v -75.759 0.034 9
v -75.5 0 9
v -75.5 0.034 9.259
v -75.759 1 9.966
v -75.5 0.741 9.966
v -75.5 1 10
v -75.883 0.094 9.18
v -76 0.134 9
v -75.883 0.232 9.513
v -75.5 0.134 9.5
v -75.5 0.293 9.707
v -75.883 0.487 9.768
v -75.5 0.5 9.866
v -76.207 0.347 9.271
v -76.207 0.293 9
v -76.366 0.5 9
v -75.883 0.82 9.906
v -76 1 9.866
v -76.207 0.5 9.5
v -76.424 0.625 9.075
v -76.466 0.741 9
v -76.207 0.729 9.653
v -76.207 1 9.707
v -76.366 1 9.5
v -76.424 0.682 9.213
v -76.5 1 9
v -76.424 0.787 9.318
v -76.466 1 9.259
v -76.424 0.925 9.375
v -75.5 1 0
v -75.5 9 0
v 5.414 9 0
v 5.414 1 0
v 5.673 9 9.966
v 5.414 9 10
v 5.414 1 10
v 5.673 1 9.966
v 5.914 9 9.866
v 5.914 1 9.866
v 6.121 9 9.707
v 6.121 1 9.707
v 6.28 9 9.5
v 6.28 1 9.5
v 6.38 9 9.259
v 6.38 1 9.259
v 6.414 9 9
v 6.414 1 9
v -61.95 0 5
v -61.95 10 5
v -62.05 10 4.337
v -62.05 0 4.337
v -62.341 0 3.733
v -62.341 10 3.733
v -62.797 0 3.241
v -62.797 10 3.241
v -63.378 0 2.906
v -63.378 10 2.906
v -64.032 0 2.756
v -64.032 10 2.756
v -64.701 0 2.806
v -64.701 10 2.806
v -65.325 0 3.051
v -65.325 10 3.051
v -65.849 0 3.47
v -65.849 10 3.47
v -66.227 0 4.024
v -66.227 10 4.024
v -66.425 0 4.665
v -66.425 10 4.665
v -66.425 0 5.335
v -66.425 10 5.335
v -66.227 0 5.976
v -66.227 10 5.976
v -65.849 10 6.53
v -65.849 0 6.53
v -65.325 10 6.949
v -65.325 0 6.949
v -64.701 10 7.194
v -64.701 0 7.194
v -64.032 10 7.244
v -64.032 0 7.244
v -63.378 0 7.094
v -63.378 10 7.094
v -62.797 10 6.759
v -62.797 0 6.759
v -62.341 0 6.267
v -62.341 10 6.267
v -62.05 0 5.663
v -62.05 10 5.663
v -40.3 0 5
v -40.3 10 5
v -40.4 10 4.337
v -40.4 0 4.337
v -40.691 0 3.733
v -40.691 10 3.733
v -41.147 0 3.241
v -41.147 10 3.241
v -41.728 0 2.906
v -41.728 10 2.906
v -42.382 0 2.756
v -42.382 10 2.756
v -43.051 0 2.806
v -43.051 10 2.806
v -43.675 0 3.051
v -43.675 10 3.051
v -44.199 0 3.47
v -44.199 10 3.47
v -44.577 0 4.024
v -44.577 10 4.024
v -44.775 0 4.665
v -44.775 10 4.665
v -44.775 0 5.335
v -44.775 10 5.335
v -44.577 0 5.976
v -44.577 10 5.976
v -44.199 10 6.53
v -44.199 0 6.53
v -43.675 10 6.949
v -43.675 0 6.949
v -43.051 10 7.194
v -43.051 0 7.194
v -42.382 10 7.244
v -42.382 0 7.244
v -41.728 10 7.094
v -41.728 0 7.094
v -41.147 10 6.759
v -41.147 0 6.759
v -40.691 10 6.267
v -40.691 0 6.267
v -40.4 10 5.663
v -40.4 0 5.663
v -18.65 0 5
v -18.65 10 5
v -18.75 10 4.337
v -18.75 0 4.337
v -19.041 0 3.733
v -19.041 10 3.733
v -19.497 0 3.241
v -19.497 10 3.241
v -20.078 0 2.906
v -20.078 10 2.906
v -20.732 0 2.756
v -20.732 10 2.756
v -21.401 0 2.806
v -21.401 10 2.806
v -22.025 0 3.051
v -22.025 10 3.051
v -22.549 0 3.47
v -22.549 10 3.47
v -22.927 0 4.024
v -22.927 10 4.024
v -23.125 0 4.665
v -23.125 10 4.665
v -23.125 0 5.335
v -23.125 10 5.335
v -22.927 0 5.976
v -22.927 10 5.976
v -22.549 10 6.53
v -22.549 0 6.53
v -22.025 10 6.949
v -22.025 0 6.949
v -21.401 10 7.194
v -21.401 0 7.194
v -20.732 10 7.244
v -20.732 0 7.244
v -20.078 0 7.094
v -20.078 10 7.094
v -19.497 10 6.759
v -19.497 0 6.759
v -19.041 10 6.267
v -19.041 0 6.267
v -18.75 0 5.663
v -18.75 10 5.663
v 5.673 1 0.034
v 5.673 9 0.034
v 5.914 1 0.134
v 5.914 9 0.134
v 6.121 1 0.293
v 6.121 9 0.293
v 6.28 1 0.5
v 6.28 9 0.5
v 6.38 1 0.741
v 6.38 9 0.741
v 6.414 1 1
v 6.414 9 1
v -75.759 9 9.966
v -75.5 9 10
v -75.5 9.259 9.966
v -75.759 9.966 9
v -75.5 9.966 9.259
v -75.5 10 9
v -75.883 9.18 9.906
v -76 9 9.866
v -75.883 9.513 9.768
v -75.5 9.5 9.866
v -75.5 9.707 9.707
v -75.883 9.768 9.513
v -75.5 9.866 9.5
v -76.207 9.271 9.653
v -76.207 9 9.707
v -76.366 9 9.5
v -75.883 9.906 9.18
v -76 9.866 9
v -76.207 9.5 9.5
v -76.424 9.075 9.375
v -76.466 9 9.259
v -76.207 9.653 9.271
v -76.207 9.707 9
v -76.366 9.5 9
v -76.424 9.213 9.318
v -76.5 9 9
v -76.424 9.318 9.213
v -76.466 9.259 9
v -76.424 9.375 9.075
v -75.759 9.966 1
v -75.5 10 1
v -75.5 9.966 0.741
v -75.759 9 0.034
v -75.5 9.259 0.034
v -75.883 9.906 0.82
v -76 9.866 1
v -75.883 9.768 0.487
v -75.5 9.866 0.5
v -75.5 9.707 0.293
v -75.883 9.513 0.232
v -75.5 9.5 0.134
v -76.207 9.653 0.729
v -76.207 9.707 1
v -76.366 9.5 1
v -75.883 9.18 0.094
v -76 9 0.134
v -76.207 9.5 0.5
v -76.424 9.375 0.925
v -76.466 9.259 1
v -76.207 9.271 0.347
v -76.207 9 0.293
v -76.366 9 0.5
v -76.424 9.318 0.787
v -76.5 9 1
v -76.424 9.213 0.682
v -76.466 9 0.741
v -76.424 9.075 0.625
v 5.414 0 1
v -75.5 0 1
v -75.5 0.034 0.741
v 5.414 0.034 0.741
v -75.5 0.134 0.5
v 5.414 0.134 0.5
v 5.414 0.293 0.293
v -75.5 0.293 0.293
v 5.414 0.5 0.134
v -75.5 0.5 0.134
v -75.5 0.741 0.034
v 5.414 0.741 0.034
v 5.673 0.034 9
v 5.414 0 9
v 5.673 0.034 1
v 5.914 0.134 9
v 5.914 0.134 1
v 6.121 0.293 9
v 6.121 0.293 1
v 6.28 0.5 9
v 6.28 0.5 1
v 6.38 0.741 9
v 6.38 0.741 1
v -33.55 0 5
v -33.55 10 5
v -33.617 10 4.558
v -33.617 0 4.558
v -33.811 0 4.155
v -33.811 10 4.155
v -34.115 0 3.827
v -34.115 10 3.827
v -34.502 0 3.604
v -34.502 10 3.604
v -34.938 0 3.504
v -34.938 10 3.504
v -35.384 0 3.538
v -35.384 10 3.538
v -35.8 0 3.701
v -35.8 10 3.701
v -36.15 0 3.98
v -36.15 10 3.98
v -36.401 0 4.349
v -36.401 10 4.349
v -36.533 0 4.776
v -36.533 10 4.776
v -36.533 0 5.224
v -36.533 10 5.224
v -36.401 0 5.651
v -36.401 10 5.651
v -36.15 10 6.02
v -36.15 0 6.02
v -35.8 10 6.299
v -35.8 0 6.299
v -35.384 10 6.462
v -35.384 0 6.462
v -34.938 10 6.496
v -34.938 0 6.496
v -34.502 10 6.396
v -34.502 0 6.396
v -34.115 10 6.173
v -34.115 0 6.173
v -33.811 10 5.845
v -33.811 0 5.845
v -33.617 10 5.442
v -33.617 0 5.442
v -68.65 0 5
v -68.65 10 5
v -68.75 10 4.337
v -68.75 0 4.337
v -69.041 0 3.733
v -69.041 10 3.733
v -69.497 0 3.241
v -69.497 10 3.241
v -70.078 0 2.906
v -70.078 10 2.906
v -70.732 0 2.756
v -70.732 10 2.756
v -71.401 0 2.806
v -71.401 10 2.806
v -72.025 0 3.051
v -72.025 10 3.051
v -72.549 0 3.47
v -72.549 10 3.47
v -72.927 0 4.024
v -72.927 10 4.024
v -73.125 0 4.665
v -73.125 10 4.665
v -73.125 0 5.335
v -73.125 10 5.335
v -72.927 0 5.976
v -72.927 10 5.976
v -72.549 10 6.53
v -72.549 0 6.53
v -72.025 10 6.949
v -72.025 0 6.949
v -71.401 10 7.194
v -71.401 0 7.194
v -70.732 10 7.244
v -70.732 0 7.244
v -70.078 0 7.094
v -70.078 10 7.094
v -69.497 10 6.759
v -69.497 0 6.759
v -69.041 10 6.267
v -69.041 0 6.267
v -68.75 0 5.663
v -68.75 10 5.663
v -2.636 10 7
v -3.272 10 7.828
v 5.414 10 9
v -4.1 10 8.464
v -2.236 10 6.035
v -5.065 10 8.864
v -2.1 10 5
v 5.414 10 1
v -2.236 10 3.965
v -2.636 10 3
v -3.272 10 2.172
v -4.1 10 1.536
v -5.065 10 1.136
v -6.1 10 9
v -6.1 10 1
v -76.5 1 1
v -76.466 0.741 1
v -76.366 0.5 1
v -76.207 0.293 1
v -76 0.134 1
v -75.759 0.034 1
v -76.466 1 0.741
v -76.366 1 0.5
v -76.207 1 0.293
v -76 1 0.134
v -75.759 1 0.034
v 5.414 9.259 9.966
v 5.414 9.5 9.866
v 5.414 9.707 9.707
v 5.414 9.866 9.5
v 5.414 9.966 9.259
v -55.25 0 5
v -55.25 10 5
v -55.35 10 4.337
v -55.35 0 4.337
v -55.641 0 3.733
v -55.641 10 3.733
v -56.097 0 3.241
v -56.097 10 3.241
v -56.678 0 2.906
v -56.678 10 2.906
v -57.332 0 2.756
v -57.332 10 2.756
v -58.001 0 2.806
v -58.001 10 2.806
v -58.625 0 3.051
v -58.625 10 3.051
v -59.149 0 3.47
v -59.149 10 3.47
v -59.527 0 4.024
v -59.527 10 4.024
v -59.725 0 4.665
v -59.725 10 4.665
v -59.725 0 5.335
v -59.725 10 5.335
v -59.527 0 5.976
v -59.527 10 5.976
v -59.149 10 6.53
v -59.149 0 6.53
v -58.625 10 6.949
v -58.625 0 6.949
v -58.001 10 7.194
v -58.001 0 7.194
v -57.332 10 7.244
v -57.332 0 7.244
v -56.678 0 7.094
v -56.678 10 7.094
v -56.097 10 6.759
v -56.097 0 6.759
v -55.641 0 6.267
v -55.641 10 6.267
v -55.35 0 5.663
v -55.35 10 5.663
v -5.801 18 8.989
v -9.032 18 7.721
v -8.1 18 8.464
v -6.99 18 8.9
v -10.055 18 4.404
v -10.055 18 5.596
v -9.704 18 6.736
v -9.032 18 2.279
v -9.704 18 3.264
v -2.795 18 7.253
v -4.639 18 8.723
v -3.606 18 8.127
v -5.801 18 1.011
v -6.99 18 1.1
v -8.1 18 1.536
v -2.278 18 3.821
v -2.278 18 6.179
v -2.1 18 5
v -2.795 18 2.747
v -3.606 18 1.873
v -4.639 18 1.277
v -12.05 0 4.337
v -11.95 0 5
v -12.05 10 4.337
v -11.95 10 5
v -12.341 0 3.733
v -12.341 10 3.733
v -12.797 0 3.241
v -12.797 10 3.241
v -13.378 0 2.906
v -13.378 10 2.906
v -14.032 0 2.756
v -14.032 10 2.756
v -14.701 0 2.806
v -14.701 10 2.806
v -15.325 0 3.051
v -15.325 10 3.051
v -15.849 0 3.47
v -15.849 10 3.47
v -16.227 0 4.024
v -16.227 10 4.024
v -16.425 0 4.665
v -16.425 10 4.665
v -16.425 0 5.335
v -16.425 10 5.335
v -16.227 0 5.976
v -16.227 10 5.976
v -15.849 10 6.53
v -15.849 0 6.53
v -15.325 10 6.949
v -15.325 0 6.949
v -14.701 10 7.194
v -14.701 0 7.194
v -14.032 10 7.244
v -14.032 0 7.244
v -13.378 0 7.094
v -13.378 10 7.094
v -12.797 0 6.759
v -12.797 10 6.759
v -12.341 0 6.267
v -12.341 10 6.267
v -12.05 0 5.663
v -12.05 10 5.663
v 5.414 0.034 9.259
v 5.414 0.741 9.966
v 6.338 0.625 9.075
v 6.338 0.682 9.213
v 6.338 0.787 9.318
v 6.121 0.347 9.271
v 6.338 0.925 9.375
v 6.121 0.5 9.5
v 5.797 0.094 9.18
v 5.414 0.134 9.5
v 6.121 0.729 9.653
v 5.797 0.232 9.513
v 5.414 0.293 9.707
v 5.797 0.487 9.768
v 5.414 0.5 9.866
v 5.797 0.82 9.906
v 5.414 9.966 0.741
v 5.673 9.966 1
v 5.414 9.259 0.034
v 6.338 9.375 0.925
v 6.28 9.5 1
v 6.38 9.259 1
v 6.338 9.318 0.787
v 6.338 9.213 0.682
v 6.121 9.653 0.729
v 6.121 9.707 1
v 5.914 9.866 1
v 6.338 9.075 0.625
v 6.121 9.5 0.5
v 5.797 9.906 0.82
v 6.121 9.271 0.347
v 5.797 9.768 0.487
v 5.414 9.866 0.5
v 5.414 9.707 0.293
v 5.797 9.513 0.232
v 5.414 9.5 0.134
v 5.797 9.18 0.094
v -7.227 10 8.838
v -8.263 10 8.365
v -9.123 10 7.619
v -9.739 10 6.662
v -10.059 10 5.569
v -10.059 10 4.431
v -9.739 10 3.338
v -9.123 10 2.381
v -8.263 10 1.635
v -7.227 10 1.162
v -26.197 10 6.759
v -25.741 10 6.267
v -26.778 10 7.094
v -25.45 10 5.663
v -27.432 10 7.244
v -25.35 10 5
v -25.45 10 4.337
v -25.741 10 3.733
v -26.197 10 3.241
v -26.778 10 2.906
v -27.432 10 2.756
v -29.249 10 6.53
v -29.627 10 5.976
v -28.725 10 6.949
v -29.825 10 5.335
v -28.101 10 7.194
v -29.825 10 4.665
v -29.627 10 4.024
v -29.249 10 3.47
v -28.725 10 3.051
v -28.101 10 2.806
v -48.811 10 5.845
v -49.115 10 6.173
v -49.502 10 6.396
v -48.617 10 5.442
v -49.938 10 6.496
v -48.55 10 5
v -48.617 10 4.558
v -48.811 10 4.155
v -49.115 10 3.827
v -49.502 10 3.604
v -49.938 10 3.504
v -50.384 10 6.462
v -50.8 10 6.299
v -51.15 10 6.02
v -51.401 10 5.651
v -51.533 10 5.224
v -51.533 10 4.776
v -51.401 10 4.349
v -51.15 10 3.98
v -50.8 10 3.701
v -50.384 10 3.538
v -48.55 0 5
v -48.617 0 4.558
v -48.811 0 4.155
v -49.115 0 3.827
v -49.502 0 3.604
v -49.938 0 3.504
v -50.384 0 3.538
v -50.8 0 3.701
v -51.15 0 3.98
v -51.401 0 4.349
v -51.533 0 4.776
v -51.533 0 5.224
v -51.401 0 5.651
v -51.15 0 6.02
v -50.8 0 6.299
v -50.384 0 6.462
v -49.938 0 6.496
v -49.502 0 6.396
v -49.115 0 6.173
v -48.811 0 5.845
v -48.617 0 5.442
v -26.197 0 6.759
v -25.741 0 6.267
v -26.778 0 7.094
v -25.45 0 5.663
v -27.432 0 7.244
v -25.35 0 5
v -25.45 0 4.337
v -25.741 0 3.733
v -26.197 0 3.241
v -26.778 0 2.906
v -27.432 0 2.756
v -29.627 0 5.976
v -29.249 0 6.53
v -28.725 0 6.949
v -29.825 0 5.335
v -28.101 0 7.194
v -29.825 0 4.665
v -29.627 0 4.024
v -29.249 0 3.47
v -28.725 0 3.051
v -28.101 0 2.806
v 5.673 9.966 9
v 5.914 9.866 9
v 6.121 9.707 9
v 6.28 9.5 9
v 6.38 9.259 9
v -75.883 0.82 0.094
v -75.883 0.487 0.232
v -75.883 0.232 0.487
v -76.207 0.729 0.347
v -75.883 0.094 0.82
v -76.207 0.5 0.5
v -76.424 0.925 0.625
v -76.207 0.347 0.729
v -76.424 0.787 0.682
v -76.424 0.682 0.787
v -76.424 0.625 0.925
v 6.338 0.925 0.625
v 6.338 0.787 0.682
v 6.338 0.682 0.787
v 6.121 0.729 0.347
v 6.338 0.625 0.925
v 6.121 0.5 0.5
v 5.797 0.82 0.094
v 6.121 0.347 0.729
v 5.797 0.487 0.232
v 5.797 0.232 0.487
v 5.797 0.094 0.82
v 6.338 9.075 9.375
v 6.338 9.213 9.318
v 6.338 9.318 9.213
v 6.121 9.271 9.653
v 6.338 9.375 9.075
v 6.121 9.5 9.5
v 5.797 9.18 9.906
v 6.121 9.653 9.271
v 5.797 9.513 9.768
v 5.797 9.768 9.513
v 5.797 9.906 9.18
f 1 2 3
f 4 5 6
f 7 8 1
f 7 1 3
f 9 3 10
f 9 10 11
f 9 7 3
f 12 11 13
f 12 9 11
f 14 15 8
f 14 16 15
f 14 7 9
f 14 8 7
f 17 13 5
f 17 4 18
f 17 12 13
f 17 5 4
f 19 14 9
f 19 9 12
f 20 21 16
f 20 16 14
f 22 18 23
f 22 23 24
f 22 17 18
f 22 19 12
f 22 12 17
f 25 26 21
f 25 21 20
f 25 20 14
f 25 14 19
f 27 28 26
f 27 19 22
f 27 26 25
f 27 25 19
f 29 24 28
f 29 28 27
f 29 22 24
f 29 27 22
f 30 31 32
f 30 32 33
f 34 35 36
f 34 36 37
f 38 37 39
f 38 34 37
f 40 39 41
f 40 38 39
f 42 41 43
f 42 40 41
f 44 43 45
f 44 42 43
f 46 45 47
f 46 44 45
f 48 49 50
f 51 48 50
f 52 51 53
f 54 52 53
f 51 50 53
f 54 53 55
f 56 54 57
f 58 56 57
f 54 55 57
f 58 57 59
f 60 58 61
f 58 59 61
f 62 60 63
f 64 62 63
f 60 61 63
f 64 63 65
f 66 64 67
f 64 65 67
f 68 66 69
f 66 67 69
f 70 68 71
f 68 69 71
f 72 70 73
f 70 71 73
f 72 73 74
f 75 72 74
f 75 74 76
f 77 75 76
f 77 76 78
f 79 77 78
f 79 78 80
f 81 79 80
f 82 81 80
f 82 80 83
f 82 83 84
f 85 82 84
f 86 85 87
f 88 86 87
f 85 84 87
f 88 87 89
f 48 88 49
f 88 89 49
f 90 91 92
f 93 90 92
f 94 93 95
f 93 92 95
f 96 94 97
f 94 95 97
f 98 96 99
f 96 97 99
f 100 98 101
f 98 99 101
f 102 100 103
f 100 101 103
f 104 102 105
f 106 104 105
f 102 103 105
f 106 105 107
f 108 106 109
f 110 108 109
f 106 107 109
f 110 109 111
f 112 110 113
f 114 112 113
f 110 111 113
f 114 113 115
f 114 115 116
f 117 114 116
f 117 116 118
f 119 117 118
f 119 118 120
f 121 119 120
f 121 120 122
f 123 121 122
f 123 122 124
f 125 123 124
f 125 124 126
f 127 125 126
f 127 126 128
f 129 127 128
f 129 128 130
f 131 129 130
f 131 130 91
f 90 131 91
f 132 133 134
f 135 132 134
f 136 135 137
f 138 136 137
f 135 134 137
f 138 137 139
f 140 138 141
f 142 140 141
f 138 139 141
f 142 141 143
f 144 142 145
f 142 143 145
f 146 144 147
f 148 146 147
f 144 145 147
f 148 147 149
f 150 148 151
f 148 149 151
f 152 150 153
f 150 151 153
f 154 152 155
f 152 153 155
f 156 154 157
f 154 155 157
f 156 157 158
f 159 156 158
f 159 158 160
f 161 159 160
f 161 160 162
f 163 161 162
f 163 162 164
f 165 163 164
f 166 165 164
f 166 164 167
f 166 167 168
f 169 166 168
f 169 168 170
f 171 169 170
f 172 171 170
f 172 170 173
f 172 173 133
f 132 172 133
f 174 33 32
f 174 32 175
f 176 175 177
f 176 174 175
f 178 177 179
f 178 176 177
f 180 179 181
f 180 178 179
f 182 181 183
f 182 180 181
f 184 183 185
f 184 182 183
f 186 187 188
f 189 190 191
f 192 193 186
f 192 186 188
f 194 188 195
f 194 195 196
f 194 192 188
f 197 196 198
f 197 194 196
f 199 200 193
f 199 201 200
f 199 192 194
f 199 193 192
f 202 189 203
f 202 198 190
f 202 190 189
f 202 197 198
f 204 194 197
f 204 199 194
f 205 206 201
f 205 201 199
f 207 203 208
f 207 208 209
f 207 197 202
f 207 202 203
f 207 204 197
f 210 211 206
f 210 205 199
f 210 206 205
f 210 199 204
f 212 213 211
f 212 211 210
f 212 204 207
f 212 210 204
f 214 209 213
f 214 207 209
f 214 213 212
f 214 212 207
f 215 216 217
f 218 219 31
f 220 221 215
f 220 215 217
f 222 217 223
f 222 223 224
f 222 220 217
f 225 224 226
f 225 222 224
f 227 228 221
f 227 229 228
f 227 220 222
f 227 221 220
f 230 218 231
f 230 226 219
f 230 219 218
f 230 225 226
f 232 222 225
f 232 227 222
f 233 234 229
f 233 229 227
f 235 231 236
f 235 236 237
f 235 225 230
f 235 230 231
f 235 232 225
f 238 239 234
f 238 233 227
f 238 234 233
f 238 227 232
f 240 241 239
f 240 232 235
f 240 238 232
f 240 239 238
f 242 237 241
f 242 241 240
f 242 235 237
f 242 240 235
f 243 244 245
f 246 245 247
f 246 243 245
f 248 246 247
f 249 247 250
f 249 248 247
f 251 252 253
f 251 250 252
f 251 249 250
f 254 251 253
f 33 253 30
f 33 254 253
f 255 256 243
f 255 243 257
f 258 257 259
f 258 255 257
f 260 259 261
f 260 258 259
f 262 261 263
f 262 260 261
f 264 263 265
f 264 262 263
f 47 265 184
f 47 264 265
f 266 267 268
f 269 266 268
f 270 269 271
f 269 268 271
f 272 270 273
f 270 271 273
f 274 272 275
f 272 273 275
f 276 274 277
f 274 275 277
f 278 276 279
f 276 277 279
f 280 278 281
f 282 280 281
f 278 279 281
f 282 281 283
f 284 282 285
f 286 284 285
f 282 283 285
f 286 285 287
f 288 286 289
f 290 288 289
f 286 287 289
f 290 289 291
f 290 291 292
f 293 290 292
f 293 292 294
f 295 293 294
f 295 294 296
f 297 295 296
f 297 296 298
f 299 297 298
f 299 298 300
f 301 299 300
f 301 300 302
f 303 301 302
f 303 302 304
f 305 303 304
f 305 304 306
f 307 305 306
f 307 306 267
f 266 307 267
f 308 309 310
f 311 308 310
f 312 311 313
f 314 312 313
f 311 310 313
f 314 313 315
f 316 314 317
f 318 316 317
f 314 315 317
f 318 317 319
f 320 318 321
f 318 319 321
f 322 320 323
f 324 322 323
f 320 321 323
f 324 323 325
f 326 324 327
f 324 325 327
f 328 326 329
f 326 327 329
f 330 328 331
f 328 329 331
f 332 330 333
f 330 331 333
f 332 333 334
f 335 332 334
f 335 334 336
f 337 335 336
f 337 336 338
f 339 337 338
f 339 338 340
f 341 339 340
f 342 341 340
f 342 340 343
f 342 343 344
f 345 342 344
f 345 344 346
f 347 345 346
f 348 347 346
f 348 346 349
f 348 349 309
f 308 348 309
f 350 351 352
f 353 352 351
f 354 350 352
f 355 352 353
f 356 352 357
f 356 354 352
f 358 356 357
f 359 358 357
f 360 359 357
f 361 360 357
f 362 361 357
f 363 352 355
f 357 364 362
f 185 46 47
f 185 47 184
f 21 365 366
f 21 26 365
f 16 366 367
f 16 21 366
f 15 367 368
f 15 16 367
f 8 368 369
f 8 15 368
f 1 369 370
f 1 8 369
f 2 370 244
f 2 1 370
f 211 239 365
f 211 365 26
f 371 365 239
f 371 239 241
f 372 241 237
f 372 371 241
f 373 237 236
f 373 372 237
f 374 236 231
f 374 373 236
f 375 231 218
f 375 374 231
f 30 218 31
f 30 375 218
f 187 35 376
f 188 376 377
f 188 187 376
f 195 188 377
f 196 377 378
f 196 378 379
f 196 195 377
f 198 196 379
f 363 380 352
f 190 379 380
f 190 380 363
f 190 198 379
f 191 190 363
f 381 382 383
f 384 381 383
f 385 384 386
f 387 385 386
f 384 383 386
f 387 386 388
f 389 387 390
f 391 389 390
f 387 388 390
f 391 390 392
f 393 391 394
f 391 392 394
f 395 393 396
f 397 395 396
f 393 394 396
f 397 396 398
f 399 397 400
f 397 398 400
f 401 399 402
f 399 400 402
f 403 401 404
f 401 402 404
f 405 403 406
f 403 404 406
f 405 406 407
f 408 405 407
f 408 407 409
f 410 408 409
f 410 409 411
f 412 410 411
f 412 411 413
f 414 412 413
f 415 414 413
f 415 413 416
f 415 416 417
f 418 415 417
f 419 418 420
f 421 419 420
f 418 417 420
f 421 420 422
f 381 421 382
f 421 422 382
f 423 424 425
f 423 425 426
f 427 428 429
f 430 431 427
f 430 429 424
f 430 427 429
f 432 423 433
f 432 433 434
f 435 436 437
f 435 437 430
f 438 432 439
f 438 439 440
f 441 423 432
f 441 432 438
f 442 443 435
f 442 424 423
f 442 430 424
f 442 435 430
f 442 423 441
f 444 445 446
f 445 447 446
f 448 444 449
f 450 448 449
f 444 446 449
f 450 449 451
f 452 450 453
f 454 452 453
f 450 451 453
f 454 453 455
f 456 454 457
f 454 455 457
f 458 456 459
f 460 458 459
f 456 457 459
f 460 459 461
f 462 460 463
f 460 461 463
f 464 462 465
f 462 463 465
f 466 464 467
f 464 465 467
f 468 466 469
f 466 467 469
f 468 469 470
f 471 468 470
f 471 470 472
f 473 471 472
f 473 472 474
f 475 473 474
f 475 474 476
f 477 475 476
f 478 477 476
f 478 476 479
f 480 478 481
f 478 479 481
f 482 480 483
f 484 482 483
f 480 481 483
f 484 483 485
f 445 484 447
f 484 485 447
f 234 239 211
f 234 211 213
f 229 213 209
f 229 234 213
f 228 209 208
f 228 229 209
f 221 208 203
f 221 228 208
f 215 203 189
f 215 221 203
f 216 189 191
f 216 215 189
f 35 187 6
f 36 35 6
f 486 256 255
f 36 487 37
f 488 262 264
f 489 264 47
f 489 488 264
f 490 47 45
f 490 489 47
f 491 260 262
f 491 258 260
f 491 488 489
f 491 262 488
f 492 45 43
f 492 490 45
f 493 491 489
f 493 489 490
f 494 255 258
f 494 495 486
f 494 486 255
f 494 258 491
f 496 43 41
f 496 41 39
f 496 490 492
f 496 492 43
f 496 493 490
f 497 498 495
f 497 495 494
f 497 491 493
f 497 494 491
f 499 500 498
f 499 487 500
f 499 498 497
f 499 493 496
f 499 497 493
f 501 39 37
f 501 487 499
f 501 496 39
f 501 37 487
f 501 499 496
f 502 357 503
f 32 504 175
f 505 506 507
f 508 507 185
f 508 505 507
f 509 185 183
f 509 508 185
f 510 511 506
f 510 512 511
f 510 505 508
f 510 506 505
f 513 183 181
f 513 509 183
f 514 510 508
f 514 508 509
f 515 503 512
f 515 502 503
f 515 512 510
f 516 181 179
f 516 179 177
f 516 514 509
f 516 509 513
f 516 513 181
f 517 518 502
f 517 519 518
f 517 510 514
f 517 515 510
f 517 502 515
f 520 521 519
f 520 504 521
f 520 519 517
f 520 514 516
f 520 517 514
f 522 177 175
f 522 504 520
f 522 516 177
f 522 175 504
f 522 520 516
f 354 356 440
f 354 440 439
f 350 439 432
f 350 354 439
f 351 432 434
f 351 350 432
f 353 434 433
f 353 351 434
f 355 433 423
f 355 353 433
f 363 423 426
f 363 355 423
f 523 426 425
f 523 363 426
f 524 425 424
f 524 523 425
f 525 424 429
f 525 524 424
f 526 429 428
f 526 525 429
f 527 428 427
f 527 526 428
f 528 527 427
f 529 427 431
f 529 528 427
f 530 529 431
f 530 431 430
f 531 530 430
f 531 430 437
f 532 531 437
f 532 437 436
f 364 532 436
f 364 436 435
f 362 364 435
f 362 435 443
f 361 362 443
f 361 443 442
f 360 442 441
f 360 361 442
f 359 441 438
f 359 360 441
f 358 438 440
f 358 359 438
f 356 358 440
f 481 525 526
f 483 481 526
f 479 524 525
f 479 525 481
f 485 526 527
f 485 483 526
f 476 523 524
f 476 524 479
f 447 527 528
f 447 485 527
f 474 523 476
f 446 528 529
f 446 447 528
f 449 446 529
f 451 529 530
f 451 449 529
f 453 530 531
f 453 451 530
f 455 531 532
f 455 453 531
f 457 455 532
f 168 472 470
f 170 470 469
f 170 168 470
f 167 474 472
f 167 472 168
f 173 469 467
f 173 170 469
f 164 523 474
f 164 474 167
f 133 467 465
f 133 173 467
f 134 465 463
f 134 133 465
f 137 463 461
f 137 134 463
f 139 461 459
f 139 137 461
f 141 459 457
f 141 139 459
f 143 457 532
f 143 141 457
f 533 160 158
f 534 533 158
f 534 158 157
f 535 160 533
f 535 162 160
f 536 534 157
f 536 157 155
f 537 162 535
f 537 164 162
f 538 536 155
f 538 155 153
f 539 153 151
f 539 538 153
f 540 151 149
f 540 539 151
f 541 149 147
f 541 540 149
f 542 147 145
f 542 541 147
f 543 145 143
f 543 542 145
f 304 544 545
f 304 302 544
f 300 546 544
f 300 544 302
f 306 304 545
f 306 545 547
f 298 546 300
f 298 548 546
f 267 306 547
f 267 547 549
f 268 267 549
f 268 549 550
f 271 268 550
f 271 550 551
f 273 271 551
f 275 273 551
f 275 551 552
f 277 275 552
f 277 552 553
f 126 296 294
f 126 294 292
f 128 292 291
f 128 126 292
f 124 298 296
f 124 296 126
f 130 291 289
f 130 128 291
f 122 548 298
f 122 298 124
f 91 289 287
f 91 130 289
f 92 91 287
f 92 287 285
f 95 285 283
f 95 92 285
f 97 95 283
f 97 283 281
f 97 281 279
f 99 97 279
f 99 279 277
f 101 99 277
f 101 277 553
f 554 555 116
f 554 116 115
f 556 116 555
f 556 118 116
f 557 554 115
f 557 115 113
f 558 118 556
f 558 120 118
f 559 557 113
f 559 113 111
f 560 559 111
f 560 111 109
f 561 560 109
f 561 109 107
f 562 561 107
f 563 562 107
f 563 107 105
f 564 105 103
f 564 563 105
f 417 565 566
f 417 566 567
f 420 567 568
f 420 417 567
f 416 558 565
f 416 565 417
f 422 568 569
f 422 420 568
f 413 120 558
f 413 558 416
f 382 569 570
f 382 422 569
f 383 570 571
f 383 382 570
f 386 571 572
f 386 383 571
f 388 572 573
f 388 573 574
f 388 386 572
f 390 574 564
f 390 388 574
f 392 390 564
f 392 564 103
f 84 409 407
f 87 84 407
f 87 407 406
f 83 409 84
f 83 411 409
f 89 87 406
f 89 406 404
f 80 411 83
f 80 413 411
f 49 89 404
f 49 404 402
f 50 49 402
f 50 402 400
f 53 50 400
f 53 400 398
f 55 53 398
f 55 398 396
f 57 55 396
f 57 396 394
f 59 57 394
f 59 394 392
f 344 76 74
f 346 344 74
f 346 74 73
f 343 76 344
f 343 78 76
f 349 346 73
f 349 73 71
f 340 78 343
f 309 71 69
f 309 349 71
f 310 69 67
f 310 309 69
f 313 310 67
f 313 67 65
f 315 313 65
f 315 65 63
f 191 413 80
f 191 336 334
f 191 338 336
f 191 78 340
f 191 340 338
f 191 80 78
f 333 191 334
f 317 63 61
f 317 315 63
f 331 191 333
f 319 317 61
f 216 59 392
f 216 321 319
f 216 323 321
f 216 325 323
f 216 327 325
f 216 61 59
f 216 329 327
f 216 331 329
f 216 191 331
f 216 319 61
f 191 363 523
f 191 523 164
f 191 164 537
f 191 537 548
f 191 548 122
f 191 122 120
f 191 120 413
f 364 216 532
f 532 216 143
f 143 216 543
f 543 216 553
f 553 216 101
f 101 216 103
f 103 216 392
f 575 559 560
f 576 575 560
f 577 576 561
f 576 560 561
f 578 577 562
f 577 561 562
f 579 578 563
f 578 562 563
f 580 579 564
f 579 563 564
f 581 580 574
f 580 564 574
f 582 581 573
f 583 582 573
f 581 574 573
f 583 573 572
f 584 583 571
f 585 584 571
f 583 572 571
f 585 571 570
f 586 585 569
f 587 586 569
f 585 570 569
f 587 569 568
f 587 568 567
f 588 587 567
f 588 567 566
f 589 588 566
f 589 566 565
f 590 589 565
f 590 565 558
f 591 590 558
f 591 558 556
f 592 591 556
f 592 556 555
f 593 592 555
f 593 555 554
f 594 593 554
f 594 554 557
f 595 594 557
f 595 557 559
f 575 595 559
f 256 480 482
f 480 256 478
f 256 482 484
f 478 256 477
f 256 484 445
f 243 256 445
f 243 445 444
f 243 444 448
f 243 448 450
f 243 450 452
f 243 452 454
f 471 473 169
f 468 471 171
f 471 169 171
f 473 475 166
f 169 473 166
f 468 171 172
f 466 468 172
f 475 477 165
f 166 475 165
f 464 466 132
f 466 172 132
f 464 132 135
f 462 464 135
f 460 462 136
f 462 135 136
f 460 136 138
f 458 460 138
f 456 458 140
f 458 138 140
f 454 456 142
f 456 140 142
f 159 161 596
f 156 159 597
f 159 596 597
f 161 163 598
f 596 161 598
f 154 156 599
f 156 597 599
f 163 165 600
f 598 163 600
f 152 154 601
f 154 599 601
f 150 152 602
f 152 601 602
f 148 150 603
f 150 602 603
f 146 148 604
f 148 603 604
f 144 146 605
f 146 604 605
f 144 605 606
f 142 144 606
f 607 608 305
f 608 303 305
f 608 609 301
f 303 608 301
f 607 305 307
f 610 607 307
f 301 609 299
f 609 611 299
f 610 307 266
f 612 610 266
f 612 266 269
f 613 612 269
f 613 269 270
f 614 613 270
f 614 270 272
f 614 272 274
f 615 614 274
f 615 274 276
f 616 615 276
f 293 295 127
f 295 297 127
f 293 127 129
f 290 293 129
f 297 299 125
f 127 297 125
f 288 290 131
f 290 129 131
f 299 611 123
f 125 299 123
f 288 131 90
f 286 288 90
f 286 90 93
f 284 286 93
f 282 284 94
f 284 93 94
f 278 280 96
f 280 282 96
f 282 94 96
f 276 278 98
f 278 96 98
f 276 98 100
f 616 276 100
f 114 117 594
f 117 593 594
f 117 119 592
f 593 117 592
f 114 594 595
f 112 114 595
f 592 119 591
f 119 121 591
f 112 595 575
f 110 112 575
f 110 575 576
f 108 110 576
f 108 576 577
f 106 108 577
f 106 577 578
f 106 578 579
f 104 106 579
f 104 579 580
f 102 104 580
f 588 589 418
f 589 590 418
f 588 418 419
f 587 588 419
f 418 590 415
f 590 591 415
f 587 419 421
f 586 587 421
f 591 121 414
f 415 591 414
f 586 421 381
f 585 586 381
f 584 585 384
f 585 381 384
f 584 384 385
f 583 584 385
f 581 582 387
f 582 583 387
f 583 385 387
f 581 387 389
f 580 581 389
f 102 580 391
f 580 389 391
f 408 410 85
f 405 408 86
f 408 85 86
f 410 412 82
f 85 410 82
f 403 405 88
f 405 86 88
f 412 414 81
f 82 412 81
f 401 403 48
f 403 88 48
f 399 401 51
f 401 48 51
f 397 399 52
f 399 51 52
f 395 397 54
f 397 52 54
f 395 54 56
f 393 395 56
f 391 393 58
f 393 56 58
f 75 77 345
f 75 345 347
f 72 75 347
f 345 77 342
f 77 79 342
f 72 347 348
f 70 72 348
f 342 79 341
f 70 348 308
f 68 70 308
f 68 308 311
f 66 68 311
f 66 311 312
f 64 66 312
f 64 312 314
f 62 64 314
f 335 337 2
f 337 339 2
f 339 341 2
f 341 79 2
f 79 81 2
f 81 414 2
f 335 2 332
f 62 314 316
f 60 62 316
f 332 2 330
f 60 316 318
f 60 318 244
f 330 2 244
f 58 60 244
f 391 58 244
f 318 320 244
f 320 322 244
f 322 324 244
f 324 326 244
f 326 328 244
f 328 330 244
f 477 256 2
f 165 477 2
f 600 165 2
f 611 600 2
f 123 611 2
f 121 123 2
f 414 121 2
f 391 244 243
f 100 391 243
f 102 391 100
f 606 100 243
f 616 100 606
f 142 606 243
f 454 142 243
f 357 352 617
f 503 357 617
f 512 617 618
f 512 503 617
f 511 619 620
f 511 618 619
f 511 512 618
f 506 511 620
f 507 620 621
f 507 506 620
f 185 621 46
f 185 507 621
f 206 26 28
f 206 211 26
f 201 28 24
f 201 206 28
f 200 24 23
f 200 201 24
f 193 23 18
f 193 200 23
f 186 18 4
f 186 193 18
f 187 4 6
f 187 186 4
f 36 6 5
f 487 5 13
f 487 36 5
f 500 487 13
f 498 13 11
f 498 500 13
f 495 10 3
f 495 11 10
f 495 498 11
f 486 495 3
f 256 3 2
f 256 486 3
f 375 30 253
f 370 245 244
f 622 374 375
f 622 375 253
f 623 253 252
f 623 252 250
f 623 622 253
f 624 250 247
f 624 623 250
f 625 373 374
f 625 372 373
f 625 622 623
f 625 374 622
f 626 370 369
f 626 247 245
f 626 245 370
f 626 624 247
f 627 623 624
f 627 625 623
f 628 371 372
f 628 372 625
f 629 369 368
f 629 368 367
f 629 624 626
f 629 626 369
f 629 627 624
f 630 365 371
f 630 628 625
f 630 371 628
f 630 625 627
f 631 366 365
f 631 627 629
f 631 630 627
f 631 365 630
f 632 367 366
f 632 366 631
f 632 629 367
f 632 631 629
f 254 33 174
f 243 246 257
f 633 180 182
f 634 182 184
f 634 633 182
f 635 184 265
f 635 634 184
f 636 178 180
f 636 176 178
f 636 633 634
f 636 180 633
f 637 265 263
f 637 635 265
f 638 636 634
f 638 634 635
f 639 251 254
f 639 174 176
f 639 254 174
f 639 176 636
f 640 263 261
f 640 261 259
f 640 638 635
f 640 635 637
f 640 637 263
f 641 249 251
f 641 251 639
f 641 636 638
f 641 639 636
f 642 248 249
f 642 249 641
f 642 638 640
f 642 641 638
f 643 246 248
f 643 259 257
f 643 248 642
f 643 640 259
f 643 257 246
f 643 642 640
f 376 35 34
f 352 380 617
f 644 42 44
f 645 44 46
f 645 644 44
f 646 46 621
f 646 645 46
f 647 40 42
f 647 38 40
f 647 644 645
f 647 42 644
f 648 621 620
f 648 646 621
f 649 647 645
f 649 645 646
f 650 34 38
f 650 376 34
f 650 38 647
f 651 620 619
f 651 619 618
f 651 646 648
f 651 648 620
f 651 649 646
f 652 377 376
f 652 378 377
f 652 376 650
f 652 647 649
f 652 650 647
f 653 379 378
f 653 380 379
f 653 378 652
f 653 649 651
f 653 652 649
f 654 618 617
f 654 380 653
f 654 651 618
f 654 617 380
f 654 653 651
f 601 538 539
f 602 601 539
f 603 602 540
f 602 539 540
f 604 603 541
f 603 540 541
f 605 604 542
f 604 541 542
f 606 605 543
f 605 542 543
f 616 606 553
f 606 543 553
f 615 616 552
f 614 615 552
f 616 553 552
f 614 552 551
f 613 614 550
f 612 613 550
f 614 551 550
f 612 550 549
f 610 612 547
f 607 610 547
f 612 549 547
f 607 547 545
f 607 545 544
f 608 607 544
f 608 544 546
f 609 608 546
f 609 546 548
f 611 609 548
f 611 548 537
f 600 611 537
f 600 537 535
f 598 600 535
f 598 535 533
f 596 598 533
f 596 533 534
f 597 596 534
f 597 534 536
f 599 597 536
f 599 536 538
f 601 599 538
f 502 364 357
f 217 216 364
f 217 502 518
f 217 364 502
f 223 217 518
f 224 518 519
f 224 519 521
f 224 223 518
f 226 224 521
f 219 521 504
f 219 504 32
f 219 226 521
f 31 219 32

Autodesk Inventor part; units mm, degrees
ref_plane "YZ Plane" through (0, 0, 0) normal (1, 0, 0) x (0, 1, 0)
ref_plane "XZ Plane" through (0, 0, 0) normal (0, 1, 0) x (-1, 0, 0)
ref_plane "XY Plane" through (0, 0, 0) normal (0, 0, 1) x (1, 0, 0)
sketch "Sketch1" plane through (0, 0, 0) normal (0, 1, 0) x (-1, 0, 0)
  line L0 (0, 0) -> (170, 0)
  line L1 (170, 0) -> (170, 10)
  line L2 (170, 10) -> (0, 10)
  line L3 (0, 10) -> (0, 0)
  dimension "d0" = 170
  dimension "d1" = 10
extrude "Extrusion1" add sketch "Sketch1" along normal blind 10
sketch "Sketch2" plane through (0, 10, 0) normal (0, 1, 0) x (1, 0, 0)
  line L0 (0, -10) -> (0, 0) projected
  line L1 (0, -5) -> (-2.2, -5)
  circle A0 centre (-6.1, -5) radius 3.9
  line L2 (0, 0) -> (-170, 0) projected
  line L3 (-170, -10) -> (0, -10) projected
  circle A1 centre (-75, -5) radius 1.5
  circle A2 centre (-95, -5) radius 1.5
  dimension "d4" = 2.2
  dimension "d8" = 3
  dimension "d9" = 3
extrude "Extrusion2" cut sketch "Sketch2" against normal blind 10 contours A1
extrude "Extrusion3" cut sketch "Sketch2" against normal blind 10 contours A2
extrude "Extrusion4" cut sketch "Sketch2" against normal blind 10 contours A0
sketch "Sketch3" plane through (0, 10, 0) normal (0, 1, 0) x (1, 0, 0)
  line L0 (-170, 0) -> (-170, -10) projected
  line L1 (-170, -5) -> (-10, -5)
  circle A0 centre (-6.1, -5) radius 3.9 projected
  line L2 (-165.7, -5) -> (-163.45, -5)
  circle A1 centre (-163.45, -5) radius 2.25
  circle A2 centre (-153.45, -5) radius 2.25
  circle A3 centre (-143.45, -5) radius 2.25
  circle A4 centre (-133.45, -5) radius 2.25
  circle A5 centre (-123.45, -5) radius 2.25
  circle A6 centre (-113.45, -5) radius 2.25
  circle A7 centre (-103.45, -5) radius 2.25
  circle A8 centre (-95, -5) radius 1.5 projected
  line L3 (-93.5, -5) -> (-93.5, -7.9104)
  circle A9 centre (-75, -5) radius 1.5 projected
  line L4 (-76.5, -5) -> (-76.5, -7.25)
  line L5 (-93.5, -5) -> (-76.5, -5)
  line L6 (-85, -5) -> (-93.5, -5)
  line L7 (-85, -5) -> (-76.5, -5)
  circle A10 centre (-80.75, -5) radius 2.25
  circle A11 centre (-89.25, -5) radius 2.25
  line L8 (-10, -5) -> (-12, -5)
  line L9 (-10, -5) -> (-14.3, -5)
  line L10 (-14.3, -5) -> (-16.55, -5)
  circle A12 centre (-16.55, -5) radius 2.25
  circle A13 centre (-26.55, -5) radius 2.25
  circle A14 centre (-36.55, -5) radius 2.25
  circle A15 centre (-46.55, -5) radius 2.25
  circle A16 centre (-56.55, -5) radius 2.25
  circle A17 centre (-66.55, -5) radius 2.25
  point P0 (0, 0)
  point P1 (-155.7, -5)
  point P2 (-145.7, -5)
  point P3 (-135.7, -5)
  point P4 (-125.7, -5)
  point P5 (-115.7, -5)
  point P6 (-105.7, -5)
  point P7 (-24.3, -5)
  point P8 (-34.3, -5)
  point P9 (-44.3, -5)
  point P10 (-54.3, -5)
  point P11 (-64.3, -5)
  dimension "d20" = 10
  dimension "d32" = 10
extrude "Extrusion5" cut sketch "Sketch3" against normal blind 10 contours A1 L1 | L1 A1 | L1 A12 | L1 A12 | A2 L1 | L1 A2 | A3 L1 | L1 A3 | A4 L1 | L1 A4 | A5 L1 | L1 A5 | A6 L1 | L1 A6 | A7 L1 | L1 A7 | A11 L1 | L1 A11 | A10 L1 | L1 A10 | A17 L1 | L1 A17 | A16 L1 | L1 A16 | A15 L1 | L1 A15 | A14 L1 | L1 A14 | A13 L1 | L1 A13
thread "Thread1" size "M3x0.5" class "6H" standard "ANSI Metric M Profile" full length
thread "Thread2" size "M3x0.5" class "6H" standard "ANSI Metric M Profile" full length
sketch "Sketch4" plane through (0, 10, 0) normal (0, 1, 0) x (1, 0, 0)
  circle A0 centre (-16.55, -5) radius 2.25 projected
  circle A1 centre (-16.55, -5) radius 2.25
  point P0 (0, 0)
extrude "Extrusion6" add sketch "Sketch4" against normal blind 10
sketch "Sketch5" plane through (0, 0, 10) normal (1, 0, 0) x (0, 0, -1)
  line L0 (10, 0) -> (0, 0) projected
  line L1 (0, 0) -> (0, 10) projected
  line L2 (10, 0) -> (0, 0)
  line L3 (0, 0) -> (0, 10)
  line L4 (0, 10) -> (10, 10)
  line L5 (10, 10) -> (10, 0)
extrude "Extrusion7" add sketch "Sketch5" along normal blind 10
sketch "Sketch6" plane through (10, 0, 10) normal (1, 0, 0) x (0, 0, -1)
  line L0 (0, 0) -> (10, 0) projected
  line L1 (0, 10) -> (0, 0) projected
  line L2 (10, 0) -> (0, 0)
  line L3 (0, 0) -> (0, 10)
  line L4 (0, 10) -> (10, 10)
  line L5 (10, 10) -> (10, 0)
extrude "Extrusion8" add sketch "Sketch6" along normal blind 10
sketch "Sketch7" plane through (0, 10, 0) normal (0, 1, 0) x (1, 0, 0)
  point P0 (0, 0)
fillet "Fillet3" radius 1 11 edges at (-75, 10, 10) (-75, 0, 10) (-75, 10, 0) (20, 5, 10) (20, 5, 0) (20, 0, 5) (-170, 10, 5) (-170, 5, 10) (-170, 5, 0) (-170, 0, 5) (-75, 0, 0)
fillet "Fillet4" radius 1 3 edges at (19.7071, 9.7071, 9.7071) (19.7071, 9.7071, 0.2929) (20, 10, 5)
sketch "Sketch8" plane through (19, 1, 0) normal (0, 0, -1) x (-1, 0, 0)
  point P0 (19, -1)
sketch "Sketch9" plane through (0, 10, 0) normal (0, 1, 0) x (1, 0, 0)
  circle A0 centre (-6.1, -5) radius 3.9 projected
  circle A1 centre (-6.1, -5) radius 2.5
  point P0 (0, 0)
  dimension "d53" = 5
extrude "Extrusion9" add sketch "Sketch9" against normal blind 10
sketch "Sketch10" plane through (0, 10, 0) normal (0, 1, 0) x (1, 0, 0)
  circle A0 centre (-6.1, -5) radius 2.5 projected
  line L0 (-3.6, -5) -> (1.4, -5)
  line L1 (19, -9) -> (19, -1) projected
  line L2 (1.4, -5) -> (-76.5, -5)
  circle A1 centre (-75, -5) radius 1.5 projected
  line L3 (-76.5, -5) -> (-76.5, -10.0231)
  line L4 (-76.5, -10.0231) -> (-76.5, 0)
  line L5 (-76.5, -10.0231) -> (-169.9715, -10.0231)
  line L6 (-169, -9) -> (19, -9) projected
  line L7 (-169.9715, 0) -> (-76.5, 0)
  line L8 (-169.9715, -10.0231) -> (-170.1763, -9.372)
  line L9 (-170.1763, -9.372) -> (-170.4489, -3.7164)
  line L10 (-170.4489, -3.7164) -> (-170.4593, -3.5)
  line L11 (-170.4593, -3.5) -> (-170.4593, -0.543)
  line L12 (-170.4593, -0.543) -> (-169.9715, 0)
  point P0 (0, 0)
  dimension "d56" = 5
extrude "Extrusion10" cut sketch "Sketch10" against normal blind 10 contours L3 L5 L8 L9 L10 L11 L12 L7 L4
sketch "Sketch11" plane through (0, 10, 0) normal (0, 1, 0) x (1, 0, 0)
  circle A0 centre (-75, -5) radius 1.5 projected
  circle A1 centre (-75, -5) radius 1.5
  circle A2 centre (-66.55, -5) radius 2.25 projected
  circle A3 centre (-66.55, -5) radius 2.25
  circle A4 centre (-56.55, -5) radius 2.25 projected
  circle A5 centre (-56.55, -5) radius 2.25
  circle A6 centre (-46.55, -5) radius 2.25 projected
  circle A7 centre (-46.55, -5) radius 2.25
  circle A8 centre (-36.55, -5) radius 2.25 projected
  circle A9 centre (-36.55, -5) radius 2.25
  circle A10 centre (-26.55, -5) radius 2.25 projected
  circle A11 centre (-26.55, -5) radius 2.25
  point P0 (0, 0)
  point P1 (-76.5, -5)
extrude "Extrusion11" add sketch "Sketch11" against normal blind 10
sketch "Sketch12" plane through (0, 10, 0) normal (0, 1, 0) x (1, 0, 0)
  circle A0 centre (-6.1, -5) radius 2.5 projected
  line L0 (-8.6, -5) -> (-76.5, -5)
  line L1 (-76.5, -9) -> (-76.5, -1) projected
  line L2 (-42.55, -5) -> (-27.55, -5)
  line L3 (-42.55, -5) -> (-57.55, -5)
  line L4 (-42.55, -5) -> (-50.05, -5)
  line L5 (-42.55, -5) -> (-35.05, -5)
  circle A1 centre (-50.05, -5) radius 1.5
  circle A2 centre (-35.05, -5) radius 1.5
  line L6 (-3.6, -5) -> (6.4143, -5)
  line L7 (6.4143, -5) -> (6.4143, -10.3738)
  line L8 (6.4143, -10.3738) -> (6.4143, 1.3096)
  line L9 (6.4143, 1.3096) -> (23.7189, 1.3096)
  line L10 (23.7189, 1.3096) -> (24.3802, -13.5702)
  line L11 (24.3802, -13.5702) -> (6.4143, -10.3738)
  point P0 (0, 0)
  dimension "d61" = 15
  dimension "d62" = 15
  dimension "d63" = 3
  dimension "d64" = 3
extrude "Extrusion12" cut sketch "Sketch12" against normal blind 10 contours A2 L0 | L0 A2 | A1 L0 | L0 A1 | L8 L9 L10 L11 L7
sketch "Sketch13" plane through (0, 10, 0) normal (0, 1, 0) x (1, 0, 0)
  circle A0 centre (-50.05, -5) radius 1.5 projected
  line L0 (-48.55, -5) -> (-36.55, -5)
  circle A1 centre (-35.05, -5) radius 1.5 projected
  circle A2 centre (-42.55, -5) radius 2.25
  line L1 (-51.55, -5) -> (-55.25, -5)
  line L2 (-33.55, -5) -> (-29.85, -5)
  circle A3 centre (-57.5, -5) radius 2.25
  circle A4 centre (-27.6, -5) radius 2.25
  circle A5 centre (-20.9, -5) radius 2.25
  circle A6 centre (-14.2, -5) radius 2.25
  circle A7 centre (-64.2, -5) radius 2.25
  circle A8 centre (-70.9, -5) radius 2.25
  point P0 (0, 0)
  dimension "d67" = 4.5
  dimension "d68" = 3.7
  dimension "d69" = 3.7
  dimension "d71" = 4.5
  dimension "d73" = 4.5
  dimension "d83" = 6.7
  dimension "d90" = 6.7
extrude "Extrusion13" cut sketch "Sketch13" against normal blind 10 contours A3 | A4 | A5 | A6 | A7 | A8
sketch "Sketch14" plane through (0, 10, 0) normal (0, 1, 0) x (1, 0, 0)
  circle A0 centre (-57.5, -5) radius 2.25 projected
  line L0 (-55.25, -5) -> (-29.85, -5)
  circle A1 centre (-27.6, -5) radius 2.25 projected
  circle A2 centre (-42.55, -5) radius 2.25
  point P0 (0, 0)
  dimension "d97" = 4.5
extrude "Extrusion14" cut sketch "Sketch14" against normal blind 10 contours A2 L0 | L0 A2
thread "Thread3" size "M3x0.5" class "6H" standard "ANSI Metric M Profile" full length
thread "Thread4" size "M3x0.5" class "6H" standard "ANSI Metric M Profile" full length
fillet "Fillet5" radius 1 16 edges at (-76.5, 9.7071, 9.7071) (-76.5, 5, 10) (-76.5, 0.2929, 9.7071) (-76.5, 0, 5) (-76.5, 0.2929, 0.2929) (-76.5, 5, 0) (-76.5, 9.7071, 0.2929) (-76.5, 10, 5) (6.4143, 9.7071, 0.2929) (6.4143, 5, 0) (6.4143, 0.2929, 0.2929) (6.4143, 0, 5) (6.4143, 0.2929, 9.7071) (6.4143, 5, 10) (6.4143, 9.7071, 9.7071) (6.4143, 10, 5)
sketch "Sketch15" plane through (0, 10, 0) normal (0, 1, 0) x (1, 0, 0)
  circle A0 centre (-6.1, -5) radius 2.5 projected
  circle A1 centre (-6.1, -5) radius 2.75
  point P0 (0, 0)
  dimension "d105" = 5.5
extrude "Extrusion15" cut sketch "Sketch15" against normal blind 10 contours A0 | A1
sketch "Sketch16" plane through (0, 10, 0) normal (0, 1, 0) x (1, 0, 0)
  circle A0 centre (-6.1, -5) radius 2.75 projected
  circle A1 centre (-6.1, -5) radius 4
  point P0 (0, 0)
  dimension "d108" = 8
extrude "Extrusion16" add sketch "Sketch16" against normal blind 10 contours A0 | A1
extrude "Extrusion17" add sketch "Sketch16" along normal blind 8 contours A0 | A1
properties part number "brazo de servo el d vdd - camara"
